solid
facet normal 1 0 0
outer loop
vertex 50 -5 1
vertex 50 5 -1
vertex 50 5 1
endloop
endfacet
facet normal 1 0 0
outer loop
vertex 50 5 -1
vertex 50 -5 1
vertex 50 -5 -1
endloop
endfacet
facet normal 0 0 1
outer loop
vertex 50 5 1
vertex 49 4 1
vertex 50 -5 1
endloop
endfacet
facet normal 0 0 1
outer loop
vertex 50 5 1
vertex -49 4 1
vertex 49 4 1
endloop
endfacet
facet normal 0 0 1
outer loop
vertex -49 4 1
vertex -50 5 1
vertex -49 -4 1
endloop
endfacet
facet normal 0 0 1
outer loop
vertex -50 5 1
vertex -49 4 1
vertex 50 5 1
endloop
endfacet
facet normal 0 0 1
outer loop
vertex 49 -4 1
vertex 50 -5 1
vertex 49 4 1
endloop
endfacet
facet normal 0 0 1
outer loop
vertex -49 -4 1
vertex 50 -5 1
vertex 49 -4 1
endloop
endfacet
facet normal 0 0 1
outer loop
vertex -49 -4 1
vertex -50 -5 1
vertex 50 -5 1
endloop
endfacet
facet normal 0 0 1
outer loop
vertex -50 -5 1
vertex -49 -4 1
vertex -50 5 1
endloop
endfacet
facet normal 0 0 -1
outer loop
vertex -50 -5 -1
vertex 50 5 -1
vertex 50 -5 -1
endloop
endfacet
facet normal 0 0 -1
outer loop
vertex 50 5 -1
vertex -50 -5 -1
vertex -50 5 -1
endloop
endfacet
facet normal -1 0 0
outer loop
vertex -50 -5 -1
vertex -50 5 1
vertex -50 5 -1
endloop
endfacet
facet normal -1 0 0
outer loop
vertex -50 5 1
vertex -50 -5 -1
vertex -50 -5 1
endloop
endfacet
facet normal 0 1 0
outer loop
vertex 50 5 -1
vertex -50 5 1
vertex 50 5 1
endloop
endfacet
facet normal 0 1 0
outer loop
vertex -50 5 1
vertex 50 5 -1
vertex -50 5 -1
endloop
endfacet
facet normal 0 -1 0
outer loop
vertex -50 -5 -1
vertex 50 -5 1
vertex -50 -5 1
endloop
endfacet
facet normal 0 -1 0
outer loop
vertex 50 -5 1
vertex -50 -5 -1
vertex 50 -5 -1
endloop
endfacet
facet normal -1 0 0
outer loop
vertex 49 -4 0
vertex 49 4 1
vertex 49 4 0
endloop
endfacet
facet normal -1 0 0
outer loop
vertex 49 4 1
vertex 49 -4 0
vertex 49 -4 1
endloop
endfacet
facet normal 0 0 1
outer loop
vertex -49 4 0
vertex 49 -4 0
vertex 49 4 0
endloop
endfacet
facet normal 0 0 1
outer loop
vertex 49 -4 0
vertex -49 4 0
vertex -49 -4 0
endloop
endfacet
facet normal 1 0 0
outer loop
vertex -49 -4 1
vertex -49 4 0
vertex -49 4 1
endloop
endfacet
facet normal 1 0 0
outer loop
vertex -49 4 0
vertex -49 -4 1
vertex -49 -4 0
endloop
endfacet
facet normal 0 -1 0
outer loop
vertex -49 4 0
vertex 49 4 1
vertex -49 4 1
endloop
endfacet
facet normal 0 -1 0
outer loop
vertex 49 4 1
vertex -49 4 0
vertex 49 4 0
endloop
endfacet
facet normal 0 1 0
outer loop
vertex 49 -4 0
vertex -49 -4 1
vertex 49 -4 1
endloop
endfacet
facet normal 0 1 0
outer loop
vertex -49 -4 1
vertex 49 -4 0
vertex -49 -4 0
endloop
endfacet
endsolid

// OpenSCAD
module light_strip(length = 100, width = 10, height = 2) {
    difference() {
        cube([length, width, height], center = true);
        translate([0, 0, height / 2])
            cube([length - 2, width - 2, height], center = true);
    }
}

light_strip();
